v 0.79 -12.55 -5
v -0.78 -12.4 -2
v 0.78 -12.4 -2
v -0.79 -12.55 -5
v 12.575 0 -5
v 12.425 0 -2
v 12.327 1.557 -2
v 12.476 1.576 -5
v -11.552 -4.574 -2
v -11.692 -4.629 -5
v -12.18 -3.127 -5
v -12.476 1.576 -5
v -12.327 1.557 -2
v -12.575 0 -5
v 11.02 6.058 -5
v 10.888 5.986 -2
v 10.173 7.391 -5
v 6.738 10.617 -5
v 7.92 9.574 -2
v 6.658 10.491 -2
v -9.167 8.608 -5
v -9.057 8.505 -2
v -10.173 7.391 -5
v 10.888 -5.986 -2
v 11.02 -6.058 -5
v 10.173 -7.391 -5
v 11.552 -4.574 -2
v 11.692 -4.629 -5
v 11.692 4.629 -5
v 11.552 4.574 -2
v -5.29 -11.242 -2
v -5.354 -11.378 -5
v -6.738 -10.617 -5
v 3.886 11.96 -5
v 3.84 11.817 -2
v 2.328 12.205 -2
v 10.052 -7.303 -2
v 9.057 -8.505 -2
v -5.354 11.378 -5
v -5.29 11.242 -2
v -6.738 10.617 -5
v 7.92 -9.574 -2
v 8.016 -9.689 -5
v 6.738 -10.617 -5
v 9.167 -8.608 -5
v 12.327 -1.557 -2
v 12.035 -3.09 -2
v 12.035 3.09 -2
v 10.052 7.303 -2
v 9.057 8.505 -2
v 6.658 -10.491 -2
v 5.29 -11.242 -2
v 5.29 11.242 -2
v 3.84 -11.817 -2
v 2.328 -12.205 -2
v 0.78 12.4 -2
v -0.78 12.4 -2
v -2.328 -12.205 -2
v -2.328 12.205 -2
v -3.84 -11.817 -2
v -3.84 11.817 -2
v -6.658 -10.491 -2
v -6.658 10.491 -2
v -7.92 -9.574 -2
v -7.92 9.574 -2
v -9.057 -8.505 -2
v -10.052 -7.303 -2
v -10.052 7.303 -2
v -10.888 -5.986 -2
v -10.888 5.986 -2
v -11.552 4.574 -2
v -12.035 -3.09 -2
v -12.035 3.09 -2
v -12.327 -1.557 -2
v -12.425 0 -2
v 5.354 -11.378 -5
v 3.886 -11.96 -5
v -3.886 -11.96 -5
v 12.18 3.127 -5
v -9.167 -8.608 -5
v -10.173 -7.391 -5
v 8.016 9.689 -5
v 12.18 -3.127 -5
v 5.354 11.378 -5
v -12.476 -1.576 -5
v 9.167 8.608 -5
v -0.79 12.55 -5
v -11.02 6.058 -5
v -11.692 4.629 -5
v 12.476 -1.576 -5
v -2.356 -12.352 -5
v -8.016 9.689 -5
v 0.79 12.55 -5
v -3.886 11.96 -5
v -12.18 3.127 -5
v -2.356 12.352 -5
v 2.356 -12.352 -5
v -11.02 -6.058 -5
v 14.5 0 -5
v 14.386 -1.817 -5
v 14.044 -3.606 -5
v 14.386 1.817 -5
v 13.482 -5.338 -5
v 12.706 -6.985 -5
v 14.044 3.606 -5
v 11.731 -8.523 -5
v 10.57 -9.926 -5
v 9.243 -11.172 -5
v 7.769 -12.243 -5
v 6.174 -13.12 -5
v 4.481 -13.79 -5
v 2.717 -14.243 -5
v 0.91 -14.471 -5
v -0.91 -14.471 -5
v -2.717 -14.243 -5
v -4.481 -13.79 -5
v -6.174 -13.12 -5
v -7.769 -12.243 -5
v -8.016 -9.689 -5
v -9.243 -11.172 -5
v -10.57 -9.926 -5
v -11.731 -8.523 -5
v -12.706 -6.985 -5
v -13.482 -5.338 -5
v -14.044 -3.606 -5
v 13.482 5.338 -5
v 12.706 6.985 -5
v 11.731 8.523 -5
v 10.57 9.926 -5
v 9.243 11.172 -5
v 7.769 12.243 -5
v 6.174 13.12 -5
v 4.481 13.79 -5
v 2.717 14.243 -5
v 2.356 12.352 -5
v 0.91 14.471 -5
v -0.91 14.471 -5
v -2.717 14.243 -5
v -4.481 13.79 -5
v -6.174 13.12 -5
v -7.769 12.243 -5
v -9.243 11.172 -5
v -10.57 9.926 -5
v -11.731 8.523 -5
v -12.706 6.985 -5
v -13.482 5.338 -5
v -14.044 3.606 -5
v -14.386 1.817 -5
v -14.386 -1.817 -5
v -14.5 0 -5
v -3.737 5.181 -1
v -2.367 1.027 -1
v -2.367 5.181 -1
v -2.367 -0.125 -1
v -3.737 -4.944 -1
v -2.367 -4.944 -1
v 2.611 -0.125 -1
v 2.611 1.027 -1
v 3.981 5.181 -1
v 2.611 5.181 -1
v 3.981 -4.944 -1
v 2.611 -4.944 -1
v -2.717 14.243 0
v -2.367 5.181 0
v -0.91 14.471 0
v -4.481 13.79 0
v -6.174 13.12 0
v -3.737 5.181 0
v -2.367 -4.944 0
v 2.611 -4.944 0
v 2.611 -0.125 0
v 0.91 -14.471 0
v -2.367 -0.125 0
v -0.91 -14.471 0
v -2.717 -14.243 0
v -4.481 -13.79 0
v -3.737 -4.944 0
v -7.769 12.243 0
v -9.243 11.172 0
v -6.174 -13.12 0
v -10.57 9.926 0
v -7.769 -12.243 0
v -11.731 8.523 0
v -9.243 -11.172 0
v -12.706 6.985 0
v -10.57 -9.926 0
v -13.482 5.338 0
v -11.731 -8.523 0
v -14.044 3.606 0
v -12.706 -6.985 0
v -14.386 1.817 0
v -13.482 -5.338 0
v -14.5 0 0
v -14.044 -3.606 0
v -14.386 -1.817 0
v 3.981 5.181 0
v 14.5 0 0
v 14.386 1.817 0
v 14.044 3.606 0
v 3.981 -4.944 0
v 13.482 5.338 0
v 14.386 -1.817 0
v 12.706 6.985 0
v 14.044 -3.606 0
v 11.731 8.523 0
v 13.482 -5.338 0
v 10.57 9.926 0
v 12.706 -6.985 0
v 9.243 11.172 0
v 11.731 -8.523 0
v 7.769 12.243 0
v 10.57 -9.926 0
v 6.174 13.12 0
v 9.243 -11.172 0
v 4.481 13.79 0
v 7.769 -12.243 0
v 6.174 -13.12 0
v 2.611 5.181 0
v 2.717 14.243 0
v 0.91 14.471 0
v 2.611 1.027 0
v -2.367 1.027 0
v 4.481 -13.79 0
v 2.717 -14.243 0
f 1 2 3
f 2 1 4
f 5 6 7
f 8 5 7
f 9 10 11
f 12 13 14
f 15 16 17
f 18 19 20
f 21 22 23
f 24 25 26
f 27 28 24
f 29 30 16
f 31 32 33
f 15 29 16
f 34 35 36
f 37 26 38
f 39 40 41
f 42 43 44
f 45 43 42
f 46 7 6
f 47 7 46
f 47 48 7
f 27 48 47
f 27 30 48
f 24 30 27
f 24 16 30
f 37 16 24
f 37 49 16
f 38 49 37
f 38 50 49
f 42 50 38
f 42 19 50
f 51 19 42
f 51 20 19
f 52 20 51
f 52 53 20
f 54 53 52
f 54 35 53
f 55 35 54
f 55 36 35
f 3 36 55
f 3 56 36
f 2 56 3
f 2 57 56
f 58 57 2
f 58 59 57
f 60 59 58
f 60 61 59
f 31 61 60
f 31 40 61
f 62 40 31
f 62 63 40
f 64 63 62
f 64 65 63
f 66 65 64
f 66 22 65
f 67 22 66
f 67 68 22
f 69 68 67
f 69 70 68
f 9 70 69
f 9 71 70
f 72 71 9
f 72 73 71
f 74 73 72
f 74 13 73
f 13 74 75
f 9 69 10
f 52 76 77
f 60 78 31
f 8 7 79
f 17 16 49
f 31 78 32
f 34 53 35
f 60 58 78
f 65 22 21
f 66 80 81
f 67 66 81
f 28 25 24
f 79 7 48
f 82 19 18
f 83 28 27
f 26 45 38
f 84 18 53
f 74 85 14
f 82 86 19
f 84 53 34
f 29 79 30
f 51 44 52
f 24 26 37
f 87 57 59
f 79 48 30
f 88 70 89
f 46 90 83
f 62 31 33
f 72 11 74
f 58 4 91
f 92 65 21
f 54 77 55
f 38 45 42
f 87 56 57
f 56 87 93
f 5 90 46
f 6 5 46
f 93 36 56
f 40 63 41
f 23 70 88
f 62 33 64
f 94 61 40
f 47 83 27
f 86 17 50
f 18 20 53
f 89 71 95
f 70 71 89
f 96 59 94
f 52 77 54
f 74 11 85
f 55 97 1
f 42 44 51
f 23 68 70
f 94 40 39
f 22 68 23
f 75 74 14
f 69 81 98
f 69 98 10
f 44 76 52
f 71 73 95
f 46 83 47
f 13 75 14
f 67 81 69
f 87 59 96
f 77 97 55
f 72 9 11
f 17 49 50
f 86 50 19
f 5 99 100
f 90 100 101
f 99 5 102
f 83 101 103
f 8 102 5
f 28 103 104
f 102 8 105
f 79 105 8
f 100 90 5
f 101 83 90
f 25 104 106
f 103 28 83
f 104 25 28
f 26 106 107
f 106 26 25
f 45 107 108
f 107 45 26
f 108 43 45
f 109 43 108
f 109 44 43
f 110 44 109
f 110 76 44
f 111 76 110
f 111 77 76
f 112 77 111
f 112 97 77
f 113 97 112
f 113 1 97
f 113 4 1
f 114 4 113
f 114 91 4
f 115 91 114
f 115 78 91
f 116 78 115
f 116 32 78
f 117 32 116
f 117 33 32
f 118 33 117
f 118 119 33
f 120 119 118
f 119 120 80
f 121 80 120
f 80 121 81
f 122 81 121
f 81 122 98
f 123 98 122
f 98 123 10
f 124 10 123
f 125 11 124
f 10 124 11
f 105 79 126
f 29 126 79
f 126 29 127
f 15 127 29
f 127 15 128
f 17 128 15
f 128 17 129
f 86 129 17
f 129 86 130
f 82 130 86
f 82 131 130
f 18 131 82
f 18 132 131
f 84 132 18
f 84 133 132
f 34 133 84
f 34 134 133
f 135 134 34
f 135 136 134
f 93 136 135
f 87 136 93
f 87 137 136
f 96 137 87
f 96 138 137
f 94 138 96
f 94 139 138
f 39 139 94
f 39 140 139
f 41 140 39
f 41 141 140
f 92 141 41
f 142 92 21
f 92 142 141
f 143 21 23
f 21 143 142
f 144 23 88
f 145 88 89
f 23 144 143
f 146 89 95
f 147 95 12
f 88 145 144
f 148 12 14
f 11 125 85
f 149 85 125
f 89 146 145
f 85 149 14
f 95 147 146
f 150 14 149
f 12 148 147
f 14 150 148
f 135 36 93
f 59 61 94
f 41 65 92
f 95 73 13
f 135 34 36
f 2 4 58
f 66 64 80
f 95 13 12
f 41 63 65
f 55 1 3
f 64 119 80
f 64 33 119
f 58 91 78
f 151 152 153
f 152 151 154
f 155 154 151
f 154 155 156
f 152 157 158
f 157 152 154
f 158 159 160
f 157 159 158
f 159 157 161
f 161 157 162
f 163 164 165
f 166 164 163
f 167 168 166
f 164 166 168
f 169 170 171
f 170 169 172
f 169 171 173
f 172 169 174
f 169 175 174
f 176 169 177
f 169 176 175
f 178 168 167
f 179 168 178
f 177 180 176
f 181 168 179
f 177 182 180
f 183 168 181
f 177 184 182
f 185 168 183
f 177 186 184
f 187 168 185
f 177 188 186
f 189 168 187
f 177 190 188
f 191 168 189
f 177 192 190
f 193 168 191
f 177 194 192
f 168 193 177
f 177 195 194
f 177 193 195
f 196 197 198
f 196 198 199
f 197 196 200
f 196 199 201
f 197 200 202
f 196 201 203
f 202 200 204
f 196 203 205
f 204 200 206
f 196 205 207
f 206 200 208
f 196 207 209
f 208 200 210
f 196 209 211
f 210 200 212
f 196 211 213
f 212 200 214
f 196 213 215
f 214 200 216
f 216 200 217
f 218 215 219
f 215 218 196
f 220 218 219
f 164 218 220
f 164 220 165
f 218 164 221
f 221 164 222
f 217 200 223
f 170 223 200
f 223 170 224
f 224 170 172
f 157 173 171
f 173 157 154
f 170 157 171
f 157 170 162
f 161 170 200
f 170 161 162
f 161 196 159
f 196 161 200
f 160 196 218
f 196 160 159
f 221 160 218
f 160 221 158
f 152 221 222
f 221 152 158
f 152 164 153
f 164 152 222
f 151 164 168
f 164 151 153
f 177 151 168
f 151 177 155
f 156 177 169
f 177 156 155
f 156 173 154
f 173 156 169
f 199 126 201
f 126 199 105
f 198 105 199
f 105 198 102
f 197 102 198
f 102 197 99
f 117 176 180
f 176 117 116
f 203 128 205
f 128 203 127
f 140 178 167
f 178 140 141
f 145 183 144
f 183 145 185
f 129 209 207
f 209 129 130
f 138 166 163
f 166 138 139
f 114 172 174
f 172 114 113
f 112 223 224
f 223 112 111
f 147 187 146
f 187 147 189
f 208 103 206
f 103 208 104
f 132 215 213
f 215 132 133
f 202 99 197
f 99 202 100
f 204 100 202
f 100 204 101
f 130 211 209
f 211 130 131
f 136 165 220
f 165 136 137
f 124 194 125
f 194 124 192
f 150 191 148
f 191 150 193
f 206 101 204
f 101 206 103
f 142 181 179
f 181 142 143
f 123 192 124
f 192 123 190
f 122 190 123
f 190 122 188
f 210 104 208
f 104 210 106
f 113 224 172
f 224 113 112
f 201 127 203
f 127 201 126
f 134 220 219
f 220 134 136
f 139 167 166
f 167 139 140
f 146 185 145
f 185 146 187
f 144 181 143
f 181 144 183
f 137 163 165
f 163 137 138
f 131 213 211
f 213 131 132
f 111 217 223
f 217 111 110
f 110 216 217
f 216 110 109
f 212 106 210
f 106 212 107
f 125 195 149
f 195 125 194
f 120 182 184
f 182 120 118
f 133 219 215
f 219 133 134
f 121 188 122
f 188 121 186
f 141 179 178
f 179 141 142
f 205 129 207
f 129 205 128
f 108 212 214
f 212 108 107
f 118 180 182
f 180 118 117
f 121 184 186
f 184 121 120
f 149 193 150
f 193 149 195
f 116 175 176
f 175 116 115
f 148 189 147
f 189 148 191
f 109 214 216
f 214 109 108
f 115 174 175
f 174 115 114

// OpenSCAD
$fn = 50;


difference() {
	union() {
		translate(v = [0, 0, -5.0000000000]) {
			cylinder(h = 5, r = 14.5000000000);
		}
	}
	union() {
		#translate(v = [0, 0, -5.0000000000]) {
			cylinder(h = 3, r1 = 12.5750000000, r2 = 12.4250000000);
		}
		translate(v = [0, 0, -1]) {
			linear_extrude(height = 1) {
				text(font = "Impact", halign = "center", size = 10, text = "H", valign = "center");
			}
		}
	}
}
